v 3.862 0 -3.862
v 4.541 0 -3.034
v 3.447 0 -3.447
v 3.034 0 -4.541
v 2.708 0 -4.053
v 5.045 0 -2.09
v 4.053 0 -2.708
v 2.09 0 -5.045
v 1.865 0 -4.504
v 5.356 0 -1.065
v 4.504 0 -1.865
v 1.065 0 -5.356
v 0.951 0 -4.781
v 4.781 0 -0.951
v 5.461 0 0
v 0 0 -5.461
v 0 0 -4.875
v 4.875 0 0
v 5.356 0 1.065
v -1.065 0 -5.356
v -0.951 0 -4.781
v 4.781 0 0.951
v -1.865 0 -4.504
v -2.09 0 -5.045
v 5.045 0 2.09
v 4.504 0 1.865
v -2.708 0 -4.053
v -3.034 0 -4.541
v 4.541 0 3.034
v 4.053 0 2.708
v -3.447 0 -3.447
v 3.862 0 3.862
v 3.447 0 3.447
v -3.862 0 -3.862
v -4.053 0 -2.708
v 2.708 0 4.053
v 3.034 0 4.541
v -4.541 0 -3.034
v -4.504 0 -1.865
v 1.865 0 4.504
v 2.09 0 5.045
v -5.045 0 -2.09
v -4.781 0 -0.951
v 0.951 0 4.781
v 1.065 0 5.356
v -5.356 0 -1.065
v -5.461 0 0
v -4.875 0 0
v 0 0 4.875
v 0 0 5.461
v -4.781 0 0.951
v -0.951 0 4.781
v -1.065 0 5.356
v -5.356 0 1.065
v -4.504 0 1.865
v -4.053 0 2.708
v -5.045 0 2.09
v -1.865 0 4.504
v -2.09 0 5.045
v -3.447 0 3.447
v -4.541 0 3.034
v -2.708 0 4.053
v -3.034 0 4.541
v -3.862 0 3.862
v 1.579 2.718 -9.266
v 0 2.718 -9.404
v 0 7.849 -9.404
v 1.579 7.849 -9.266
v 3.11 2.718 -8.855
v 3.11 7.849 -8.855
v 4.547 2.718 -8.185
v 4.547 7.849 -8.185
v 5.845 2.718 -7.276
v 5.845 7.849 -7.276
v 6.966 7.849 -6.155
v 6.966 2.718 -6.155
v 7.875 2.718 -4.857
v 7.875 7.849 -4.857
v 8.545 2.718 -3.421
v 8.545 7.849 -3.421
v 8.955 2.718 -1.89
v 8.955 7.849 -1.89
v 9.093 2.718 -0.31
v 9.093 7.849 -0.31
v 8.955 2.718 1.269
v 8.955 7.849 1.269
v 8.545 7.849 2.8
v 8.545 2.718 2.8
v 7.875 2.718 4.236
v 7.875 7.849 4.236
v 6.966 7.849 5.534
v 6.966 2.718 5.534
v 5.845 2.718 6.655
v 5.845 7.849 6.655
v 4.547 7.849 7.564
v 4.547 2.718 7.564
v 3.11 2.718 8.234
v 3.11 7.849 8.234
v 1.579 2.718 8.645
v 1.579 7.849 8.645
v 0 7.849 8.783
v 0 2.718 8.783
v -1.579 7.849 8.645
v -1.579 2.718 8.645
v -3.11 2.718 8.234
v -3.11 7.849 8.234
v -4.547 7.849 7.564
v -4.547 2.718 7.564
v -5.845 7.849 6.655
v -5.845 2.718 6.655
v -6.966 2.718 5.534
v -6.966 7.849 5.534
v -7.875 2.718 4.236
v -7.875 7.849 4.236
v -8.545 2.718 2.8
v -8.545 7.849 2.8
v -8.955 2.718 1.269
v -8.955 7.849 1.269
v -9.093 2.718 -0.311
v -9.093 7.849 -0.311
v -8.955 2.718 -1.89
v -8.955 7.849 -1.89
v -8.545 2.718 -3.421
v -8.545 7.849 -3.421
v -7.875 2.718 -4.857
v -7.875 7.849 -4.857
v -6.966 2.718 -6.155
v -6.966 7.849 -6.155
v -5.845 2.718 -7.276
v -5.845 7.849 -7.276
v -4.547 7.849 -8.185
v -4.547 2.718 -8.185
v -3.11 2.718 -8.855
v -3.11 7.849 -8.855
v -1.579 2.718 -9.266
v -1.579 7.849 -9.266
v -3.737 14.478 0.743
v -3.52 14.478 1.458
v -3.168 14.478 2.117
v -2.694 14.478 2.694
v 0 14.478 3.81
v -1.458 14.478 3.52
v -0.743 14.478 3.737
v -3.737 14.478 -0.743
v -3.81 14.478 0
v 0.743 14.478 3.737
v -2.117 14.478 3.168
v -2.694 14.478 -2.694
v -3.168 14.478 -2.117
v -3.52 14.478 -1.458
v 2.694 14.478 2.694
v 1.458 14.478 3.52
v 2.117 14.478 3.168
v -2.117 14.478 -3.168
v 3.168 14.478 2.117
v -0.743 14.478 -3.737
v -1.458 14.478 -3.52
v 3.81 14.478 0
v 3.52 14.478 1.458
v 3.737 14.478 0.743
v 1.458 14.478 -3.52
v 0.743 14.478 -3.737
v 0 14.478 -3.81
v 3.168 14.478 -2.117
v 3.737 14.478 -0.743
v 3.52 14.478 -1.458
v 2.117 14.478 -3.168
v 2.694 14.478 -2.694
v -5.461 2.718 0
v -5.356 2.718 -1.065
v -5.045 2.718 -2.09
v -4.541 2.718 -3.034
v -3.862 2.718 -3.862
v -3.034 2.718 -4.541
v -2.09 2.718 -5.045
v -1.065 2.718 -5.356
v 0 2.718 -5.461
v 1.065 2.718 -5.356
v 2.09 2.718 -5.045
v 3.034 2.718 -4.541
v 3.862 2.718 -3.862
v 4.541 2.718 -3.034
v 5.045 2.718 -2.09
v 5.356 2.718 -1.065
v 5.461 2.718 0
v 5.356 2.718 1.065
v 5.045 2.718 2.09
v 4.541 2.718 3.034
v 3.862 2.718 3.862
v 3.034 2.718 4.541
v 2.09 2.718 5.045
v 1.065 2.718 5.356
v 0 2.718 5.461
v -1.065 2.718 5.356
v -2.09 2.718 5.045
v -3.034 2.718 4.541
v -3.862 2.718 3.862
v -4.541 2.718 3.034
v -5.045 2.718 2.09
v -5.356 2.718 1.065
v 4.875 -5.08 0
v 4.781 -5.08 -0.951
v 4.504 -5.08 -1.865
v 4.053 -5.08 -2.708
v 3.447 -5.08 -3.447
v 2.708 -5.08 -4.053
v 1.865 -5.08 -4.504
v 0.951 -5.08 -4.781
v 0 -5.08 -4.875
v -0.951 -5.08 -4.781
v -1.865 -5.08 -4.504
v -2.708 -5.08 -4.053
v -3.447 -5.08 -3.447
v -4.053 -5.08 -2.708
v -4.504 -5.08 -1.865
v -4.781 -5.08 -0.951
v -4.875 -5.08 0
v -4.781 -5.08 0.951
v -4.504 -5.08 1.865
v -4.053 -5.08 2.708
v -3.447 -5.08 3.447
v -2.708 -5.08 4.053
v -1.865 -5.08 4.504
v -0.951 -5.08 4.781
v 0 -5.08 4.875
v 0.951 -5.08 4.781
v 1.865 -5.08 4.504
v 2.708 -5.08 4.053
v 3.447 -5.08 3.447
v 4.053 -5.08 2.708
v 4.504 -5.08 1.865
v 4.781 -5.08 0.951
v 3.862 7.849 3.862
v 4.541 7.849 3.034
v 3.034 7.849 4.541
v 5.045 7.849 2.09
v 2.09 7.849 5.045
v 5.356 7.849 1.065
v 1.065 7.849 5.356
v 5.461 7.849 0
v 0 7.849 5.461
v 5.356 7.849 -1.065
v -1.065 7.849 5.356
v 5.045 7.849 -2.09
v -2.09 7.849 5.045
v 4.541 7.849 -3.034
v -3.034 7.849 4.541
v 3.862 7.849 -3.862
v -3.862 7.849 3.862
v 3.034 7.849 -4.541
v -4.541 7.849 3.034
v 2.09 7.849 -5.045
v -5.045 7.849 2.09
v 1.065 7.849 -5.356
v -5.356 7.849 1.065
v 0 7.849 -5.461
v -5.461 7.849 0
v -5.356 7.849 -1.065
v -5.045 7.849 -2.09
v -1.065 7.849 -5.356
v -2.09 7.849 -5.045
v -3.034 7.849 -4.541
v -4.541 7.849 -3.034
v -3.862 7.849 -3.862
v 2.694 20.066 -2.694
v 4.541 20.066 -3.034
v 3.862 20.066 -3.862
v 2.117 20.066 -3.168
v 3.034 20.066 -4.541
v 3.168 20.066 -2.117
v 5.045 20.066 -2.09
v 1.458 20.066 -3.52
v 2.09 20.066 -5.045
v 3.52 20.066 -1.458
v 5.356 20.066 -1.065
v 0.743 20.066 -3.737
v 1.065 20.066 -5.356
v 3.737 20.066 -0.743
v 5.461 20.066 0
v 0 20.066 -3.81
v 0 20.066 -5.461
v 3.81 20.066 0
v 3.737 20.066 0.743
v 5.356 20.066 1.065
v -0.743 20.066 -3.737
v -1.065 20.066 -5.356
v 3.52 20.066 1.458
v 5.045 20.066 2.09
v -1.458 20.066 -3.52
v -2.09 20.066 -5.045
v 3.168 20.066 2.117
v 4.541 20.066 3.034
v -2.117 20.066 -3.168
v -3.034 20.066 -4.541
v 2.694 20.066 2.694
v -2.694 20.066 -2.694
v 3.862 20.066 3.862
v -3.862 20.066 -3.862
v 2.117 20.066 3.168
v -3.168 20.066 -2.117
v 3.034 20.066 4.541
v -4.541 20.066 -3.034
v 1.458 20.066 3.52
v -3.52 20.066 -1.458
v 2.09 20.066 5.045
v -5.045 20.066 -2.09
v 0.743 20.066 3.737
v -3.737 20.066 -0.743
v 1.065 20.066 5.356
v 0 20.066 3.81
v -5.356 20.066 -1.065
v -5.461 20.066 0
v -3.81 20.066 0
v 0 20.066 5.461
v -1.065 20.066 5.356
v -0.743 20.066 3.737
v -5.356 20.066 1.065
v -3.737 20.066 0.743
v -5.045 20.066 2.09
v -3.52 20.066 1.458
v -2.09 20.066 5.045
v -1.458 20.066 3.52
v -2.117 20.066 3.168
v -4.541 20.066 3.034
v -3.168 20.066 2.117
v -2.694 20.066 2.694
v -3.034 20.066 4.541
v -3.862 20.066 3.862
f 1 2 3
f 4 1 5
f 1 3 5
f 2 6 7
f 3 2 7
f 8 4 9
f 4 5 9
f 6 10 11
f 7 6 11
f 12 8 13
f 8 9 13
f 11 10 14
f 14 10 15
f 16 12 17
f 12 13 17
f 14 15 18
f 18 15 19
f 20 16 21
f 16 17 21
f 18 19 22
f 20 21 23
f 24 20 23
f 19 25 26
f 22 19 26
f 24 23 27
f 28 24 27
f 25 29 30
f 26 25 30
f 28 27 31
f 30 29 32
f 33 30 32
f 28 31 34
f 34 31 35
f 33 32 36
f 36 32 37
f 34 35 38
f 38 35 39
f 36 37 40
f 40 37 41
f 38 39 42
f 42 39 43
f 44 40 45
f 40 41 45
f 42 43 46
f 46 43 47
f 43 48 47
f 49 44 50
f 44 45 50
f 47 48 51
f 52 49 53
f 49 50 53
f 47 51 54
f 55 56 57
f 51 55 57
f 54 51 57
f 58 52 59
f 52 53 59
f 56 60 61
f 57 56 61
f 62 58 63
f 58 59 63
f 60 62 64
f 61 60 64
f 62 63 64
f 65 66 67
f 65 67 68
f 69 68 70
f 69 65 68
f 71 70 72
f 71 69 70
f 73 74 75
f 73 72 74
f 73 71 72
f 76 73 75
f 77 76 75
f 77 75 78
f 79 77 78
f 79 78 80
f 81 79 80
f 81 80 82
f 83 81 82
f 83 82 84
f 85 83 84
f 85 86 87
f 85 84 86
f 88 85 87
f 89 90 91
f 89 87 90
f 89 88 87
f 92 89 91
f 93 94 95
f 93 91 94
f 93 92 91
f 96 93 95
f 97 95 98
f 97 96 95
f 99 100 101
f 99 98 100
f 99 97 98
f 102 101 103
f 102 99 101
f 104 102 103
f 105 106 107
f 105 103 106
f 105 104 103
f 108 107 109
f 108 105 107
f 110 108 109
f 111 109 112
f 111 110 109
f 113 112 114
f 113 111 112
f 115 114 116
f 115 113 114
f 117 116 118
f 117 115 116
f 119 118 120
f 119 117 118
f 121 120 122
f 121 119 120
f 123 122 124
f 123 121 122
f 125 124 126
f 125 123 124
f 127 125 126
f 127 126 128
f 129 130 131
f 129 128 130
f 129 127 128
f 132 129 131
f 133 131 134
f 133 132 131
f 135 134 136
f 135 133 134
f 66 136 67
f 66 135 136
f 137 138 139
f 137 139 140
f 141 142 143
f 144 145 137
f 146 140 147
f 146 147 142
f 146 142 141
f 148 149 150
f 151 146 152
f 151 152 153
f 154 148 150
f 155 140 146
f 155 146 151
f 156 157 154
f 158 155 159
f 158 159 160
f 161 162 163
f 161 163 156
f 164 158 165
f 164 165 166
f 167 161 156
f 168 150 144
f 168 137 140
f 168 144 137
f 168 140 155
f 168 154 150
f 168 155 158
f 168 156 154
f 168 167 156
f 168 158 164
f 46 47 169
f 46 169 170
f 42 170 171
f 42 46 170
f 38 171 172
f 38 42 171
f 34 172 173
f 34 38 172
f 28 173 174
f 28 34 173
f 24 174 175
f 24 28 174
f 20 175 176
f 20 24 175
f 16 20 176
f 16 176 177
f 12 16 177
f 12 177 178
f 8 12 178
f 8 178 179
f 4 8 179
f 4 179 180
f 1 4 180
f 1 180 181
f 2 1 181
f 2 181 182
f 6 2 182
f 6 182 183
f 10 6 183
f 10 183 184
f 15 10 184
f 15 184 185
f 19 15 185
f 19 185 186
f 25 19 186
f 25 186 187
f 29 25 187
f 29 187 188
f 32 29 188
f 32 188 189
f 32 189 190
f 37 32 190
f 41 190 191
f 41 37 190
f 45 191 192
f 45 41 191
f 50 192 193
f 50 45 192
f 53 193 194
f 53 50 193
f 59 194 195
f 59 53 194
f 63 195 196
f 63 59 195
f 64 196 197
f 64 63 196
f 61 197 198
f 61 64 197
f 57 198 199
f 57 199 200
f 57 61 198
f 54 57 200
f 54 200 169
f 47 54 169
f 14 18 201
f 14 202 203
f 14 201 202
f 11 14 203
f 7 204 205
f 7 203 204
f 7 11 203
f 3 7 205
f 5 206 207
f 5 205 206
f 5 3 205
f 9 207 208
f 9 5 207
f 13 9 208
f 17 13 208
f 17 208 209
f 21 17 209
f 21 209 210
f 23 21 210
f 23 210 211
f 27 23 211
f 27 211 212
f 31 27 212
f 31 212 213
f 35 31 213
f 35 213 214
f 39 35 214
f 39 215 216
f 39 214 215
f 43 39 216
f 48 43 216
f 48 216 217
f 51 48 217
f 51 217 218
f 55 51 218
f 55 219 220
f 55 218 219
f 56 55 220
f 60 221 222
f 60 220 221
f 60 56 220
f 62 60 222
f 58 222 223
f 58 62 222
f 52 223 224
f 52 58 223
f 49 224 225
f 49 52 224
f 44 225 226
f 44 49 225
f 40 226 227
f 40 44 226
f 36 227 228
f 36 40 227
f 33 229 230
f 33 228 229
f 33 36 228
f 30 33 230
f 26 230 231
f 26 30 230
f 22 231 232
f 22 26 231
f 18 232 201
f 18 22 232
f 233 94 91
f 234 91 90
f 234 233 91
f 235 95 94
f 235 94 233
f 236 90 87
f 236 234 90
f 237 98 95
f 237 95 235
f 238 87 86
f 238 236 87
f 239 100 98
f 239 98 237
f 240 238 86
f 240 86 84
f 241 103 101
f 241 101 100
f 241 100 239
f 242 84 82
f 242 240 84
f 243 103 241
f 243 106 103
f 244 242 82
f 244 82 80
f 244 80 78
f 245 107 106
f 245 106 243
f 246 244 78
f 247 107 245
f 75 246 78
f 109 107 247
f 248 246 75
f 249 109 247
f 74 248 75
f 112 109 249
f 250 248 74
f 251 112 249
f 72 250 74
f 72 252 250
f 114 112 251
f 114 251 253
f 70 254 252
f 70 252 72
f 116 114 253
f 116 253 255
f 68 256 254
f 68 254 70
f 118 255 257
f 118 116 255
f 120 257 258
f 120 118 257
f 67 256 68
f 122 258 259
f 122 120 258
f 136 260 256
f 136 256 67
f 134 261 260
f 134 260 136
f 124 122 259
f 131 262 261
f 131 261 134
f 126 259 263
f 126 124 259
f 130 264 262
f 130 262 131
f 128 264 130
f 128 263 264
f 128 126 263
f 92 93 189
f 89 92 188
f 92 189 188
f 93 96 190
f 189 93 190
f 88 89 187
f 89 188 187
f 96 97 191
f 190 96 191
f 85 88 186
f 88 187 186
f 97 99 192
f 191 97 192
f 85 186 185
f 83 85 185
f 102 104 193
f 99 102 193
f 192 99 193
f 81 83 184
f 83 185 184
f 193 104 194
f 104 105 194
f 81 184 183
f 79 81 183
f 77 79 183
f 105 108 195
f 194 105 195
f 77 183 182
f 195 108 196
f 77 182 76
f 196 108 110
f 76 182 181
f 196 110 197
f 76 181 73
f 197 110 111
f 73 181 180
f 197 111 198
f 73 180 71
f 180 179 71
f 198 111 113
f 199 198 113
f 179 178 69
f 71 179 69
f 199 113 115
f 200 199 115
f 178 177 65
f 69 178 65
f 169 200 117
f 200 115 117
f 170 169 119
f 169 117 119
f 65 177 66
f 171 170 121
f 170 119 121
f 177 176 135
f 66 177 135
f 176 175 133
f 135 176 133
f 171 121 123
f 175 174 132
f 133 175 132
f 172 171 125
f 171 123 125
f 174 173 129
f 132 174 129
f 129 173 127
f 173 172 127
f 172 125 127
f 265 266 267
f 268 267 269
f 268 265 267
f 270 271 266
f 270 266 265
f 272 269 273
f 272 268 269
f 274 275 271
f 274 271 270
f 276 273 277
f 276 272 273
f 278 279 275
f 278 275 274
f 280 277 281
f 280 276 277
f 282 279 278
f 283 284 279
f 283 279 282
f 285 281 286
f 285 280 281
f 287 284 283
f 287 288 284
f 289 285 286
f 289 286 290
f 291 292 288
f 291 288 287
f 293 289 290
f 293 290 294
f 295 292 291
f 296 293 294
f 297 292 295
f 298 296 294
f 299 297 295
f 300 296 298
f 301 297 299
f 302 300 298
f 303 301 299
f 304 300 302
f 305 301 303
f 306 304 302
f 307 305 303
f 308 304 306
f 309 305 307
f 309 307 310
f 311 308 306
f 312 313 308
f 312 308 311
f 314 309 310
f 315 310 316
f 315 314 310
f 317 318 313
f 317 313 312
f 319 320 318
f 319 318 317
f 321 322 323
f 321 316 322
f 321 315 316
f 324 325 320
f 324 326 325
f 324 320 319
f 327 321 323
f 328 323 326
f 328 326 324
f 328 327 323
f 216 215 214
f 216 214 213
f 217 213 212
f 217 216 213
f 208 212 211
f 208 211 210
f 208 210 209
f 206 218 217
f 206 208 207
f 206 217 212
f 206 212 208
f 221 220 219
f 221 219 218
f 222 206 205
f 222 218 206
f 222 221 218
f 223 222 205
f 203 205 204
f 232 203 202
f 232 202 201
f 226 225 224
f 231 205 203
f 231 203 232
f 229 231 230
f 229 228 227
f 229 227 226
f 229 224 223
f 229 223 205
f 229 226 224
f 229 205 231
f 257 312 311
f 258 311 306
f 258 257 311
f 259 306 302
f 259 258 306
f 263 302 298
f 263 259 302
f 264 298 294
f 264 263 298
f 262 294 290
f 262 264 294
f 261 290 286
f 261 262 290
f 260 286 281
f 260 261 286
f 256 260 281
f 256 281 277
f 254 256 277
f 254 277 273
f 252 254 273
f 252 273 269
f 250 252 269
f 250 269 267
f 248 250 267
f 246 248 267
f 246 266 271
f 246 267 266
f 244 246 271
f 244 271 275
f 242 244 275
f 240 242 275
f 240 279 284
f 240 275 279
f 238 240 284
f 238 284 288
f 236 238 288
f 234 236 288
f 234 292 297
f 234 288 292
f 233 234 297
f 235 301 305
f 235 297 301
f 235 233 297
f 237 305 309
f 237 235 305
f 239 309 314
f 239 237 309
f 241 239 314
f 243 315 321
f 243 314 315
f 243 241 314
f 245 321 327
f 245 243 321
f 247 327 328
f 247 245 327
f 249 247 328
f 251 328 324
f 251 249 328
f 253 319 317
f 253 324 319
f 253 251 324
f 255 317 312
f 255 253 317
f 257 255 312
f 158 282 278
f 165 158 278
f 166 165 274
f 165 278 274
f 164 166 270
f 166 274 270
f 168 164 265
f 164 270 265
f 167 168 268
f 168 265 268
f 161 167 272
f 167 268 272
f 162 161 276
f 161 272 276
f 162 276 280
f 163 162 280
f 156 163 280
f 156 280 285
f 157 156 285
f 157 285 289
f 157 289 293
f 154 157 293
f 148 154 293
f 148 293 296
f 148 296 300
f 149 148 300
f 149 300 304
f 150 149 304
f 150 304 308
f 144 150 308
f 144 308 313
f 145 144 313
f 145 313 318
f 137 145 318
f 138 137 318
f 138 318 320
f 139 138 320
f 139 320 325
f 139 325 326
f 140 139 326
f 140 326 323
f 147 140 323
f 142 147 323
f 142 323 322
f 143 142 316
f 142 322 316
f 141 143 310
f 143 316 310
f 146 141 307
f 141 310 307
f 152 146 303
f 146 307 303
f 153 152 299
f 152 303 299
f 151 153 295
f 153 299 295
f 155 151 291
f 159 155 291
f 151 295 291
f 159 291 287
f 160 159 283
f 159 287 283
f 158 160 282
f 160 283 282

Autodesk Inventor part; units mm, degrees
ref_plane "YZ Plane" through (0, 0, 0) normal (1, 0, 0) x (0, 1, 0)
ref_plane "XZ Plane" through (0, 0, 0) normal (0, 1, 0) x (-1, 0, 0)
ref_plane "XY Plane" through (0, 0, 0) normal (0, 0, 1) x (1, 0, 0)
sketch "Sketch1" plane through (0, 0, 0) normal (0, 1, 0) x (-1, 0, 0)
  circle A0 centre (0, 0) radius 5.461
  dimension "d0" = 10.922
extrude "Extrusion1" add sketch "Sketch1" along normal blind 20.066
sketch "Sketch2" plane through (0, 0, 0) normal (1, 0, 0) x (0, 1, 0)
  line L0 (2.7178, -0.3105) -> (7.8486, -0.3105)
  line L1 (7.8486, -0.3105) -> (7.8486, -9.4037)
  line L2 (7.8486, -9.4037) -> (2.7178, -9.4037)
  line L3 (2.7178, -9.4037) -> (2.7178, -0.3105)
  line L4 (0, 5.461) -> (0, -5.461) projected
  line L5 (20.066, -5.461) -> (20.066, 5.461) projected
  point P0 (0, 0)
  dimension "d3" = 9.0932
  dimension "d4" = 2.7178
  dimension "d12" = 12.2174
revolve "Revolution1" add sketch "Sketch2" angle 360 about axis through (0, 2.7178, -0.3105) along (0, 1, 0)
sketch "Sketch3" plane through (0, 0, 0) normal (0, -1, 0) x (1, 0, 0)
  circle A0 centre (0, 0) radius 5.461 projected
  circle A1 centre (0, 0) radius 4.8747
extrude "Extrusion2" add sketch "Sketch3" along normal blind 5.08 contours A1
sketch "Sketch4" plane through (0, 20.066, 0) normal (0, 1, 0) x (1, 0, 0)
  circle A0 centre (0, 0) radius 5.461 projected
  circle A1 centre (0, 0) radius 3.81
  dimension "d9" = 7.62
extrude "Extrusion3" cut sketch "Sketch4" against normal blind 5.588 contours A1
properties part number "SmallConnector"
